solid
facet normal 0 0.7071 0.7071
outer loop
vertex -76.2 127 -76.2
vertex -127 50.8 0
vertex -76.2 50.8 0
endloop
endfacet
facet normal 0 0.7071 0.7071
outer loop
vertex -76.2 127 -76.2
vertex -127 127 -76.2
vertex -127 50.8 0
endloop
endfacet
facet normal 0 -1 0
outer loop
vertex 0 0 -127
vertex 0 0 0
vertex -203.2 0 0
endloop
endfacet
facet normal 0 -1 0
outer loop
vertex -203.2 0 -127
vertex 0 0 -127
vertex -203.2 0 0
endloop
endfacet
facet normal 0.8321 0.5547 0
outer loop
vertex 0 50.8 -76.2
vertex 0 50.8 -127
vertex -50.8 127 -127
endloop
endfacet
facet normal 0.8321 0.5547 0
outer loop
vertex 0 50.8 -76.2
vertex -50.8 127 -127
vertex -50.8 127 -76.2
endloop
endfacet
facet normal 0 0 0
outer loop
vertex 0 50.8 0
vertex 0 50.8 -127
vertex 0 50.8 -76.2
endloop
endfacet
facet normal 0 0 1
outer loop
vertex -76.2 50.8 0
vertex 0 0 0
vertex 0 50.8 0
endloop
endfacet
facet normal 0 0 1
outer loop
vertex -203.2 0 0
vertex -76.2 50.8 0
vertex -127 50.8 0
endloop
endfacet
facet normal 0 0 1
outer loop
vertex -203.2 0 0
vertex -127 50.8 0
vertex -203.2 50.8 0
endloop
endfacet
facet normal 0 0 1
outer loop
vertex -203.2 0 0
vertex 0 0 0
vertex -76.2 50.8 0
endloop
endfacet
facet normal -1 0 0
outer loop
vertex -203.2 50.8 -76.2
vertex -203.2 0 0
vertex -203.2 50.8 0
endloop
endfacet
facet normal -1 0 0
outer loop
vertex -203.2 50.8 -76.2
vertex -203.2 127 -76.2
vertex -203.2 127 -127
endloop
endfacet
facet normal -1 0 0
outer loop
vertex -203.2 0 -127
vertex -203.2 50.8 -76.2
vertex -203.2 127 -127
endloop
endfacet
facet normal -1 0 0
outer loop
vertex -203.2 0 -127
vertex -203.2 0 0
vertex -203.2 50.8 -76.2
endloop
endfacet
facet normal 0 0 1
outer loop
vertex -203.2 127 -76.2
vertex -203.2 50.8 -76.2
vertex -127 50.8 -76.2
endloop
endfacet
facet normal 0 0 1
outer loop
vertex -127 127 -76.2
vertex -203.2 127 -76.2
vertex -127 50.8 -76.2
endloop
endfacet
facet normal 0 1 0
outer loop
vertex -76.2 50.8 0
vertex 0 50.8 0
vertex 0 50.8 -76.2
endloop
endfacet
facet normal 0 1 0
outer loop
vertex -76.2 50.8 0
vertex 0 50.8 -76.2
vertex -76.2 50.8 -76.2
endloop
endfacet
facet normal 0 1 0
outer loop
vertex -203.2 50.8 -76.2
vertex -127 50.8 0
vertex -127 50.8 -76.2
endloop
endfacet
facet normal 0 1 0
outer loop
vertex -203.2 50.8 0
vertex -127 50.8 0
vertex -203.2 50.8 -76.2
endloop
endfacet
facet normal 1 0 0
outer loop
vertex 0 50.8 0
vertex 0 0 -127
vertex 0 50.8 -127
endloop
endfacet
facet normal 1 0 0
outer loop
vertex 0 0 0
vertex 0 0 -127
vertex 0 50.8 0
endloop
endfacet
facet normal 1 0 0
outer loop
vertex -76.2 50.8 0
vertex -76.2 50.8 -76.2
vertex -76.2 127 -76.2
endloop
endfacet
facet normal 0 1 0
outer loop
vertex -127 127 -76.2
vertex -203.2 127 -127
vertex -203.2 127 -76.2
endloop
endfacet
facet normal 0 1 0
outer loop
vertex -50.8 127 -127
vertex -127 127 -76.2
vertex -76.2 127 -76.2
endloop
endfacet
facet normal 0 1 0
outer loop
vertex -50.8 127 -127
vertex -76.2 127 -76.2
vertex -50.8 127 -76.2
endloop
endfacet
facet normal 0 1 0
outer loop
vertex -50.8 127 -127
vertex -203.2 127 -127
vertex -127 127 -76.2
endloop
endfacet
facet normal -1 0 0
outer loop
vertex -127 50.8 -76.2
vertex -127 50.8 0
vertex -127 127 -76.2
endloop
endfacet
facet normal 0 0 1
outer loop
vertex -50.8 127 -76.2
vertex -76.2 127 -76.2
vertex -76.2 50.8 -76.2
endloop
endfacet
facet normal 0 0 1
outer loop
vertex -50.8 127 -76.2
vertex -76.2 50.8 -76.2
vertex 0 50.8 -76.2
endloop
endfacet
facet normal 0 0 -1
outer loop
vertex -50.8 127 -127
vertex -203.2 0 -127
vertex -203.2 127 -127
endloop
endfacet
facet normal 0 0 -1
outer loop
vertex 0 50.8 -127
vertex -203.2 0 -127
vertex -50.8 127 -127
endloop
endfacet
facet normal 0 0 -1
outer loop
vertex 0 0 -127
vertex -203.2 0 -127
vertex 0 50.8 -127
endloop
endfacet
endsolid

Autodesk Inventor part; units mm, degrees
ref_plane "YZ Plane" through (0, 0, 0) normal (1, 0, 0) x (0, 1, 0)
ref_plane "XZ Plane" through (0, 0, 0) normal (0, 1, 0) x (-1, 0, 0)
ref_plane "XY Plane" through (0, 0, 0) normal (0, 0, 1) x (1, 0, 0)
sketch "Sketch1" plane through (0, 0, 0) normal (0, 1, 0) x (-1, 0, 0)
  line L0 (0, 0) -> (203.2, 0)
  line L1 (203.2, 0) -> (203.2, -127)
  line L2 (203.2, -127) -> (0, -127)
  line L3 (0, -127) -> (0, 0)
  dimension "d0" = 203.2
  dimension "d1" = 127
extrude "Extrusion1" add sketch "Sketch1" along normal blind 50.8
sketch "Sketch2" plane through (0, 50.8, 0) normal (0, 1, 0) x (1, 0, 0)
  line L0 (-203.2, 127) -> (-203.2, 0) projected
  line L1 (-203.2, 76.2) -> (0, 76.2)
  line L2 (0, 76.2) -> (0, 127)
  line L3 (0, 127) -> (-203.2, 127)
  line L4 (-203.2, 127) -> (-203.2, 76.2)
  point P0 (0, 0)
  dimension "d4" = 50.8
  dimension "d13" = 203.2
extrude "Extrusion2" add sketch "Sketch2" along normal blind 76.2
chamfer "Chamfer1" distance 50.8 angle 56.31 1 edges at (0, 127, -101.6) measured on face at (-67.7333, 127, -110.0667)
sketch "Sketch3" plane through (0, 50.8, 0) normal (0, 1, 0) x (1, 0, 0)
  line L0 (0, 76.2) -> (-203.2, 76.2) projected
  line L1 (-127, 76.2) -> (-76.2, 76.2)
  line L2 (-76.2, 76.2) -> (-76.2, 0)
  line L3 (-76.2, 0) -> (-127, 0)
  line L4 (-127, 0) -> (-127, 76.2)
  line L5 (-203.2, 76.2) -> (-203.2, 0) projected
  point P0 (0, 0)
  dimension "d10" = 50.8
  dimension "d11" = 76.2
  dimension "d12" = 76.2
extrude "Extrusion3" add sketch "Sketch3" along normal blind 76.2
chamfer "Chamfer2" distance 76.2 angle 45 1 edges at (-101.6, 127, 0)
sketch "Sketch4" plane through (-0.0002, 50.7998, -127) normal (0.8321, 0.5547, 0) x (-0.5547, 0.8321, 0)
  point P0 (-42.2682, 127)
sketch "Sketch5" plane through (0, 127, 0) normal (0, 1, 0) x (1, 0, 0)
  point P0 (0, 0)
sketch "Sketch6" plane through (-50.8, 127, -127) normal (0.8321, 0.5547, 0) x (-0.5547, 0.8321, 0)
  point P0 (-133.8492, 127)
